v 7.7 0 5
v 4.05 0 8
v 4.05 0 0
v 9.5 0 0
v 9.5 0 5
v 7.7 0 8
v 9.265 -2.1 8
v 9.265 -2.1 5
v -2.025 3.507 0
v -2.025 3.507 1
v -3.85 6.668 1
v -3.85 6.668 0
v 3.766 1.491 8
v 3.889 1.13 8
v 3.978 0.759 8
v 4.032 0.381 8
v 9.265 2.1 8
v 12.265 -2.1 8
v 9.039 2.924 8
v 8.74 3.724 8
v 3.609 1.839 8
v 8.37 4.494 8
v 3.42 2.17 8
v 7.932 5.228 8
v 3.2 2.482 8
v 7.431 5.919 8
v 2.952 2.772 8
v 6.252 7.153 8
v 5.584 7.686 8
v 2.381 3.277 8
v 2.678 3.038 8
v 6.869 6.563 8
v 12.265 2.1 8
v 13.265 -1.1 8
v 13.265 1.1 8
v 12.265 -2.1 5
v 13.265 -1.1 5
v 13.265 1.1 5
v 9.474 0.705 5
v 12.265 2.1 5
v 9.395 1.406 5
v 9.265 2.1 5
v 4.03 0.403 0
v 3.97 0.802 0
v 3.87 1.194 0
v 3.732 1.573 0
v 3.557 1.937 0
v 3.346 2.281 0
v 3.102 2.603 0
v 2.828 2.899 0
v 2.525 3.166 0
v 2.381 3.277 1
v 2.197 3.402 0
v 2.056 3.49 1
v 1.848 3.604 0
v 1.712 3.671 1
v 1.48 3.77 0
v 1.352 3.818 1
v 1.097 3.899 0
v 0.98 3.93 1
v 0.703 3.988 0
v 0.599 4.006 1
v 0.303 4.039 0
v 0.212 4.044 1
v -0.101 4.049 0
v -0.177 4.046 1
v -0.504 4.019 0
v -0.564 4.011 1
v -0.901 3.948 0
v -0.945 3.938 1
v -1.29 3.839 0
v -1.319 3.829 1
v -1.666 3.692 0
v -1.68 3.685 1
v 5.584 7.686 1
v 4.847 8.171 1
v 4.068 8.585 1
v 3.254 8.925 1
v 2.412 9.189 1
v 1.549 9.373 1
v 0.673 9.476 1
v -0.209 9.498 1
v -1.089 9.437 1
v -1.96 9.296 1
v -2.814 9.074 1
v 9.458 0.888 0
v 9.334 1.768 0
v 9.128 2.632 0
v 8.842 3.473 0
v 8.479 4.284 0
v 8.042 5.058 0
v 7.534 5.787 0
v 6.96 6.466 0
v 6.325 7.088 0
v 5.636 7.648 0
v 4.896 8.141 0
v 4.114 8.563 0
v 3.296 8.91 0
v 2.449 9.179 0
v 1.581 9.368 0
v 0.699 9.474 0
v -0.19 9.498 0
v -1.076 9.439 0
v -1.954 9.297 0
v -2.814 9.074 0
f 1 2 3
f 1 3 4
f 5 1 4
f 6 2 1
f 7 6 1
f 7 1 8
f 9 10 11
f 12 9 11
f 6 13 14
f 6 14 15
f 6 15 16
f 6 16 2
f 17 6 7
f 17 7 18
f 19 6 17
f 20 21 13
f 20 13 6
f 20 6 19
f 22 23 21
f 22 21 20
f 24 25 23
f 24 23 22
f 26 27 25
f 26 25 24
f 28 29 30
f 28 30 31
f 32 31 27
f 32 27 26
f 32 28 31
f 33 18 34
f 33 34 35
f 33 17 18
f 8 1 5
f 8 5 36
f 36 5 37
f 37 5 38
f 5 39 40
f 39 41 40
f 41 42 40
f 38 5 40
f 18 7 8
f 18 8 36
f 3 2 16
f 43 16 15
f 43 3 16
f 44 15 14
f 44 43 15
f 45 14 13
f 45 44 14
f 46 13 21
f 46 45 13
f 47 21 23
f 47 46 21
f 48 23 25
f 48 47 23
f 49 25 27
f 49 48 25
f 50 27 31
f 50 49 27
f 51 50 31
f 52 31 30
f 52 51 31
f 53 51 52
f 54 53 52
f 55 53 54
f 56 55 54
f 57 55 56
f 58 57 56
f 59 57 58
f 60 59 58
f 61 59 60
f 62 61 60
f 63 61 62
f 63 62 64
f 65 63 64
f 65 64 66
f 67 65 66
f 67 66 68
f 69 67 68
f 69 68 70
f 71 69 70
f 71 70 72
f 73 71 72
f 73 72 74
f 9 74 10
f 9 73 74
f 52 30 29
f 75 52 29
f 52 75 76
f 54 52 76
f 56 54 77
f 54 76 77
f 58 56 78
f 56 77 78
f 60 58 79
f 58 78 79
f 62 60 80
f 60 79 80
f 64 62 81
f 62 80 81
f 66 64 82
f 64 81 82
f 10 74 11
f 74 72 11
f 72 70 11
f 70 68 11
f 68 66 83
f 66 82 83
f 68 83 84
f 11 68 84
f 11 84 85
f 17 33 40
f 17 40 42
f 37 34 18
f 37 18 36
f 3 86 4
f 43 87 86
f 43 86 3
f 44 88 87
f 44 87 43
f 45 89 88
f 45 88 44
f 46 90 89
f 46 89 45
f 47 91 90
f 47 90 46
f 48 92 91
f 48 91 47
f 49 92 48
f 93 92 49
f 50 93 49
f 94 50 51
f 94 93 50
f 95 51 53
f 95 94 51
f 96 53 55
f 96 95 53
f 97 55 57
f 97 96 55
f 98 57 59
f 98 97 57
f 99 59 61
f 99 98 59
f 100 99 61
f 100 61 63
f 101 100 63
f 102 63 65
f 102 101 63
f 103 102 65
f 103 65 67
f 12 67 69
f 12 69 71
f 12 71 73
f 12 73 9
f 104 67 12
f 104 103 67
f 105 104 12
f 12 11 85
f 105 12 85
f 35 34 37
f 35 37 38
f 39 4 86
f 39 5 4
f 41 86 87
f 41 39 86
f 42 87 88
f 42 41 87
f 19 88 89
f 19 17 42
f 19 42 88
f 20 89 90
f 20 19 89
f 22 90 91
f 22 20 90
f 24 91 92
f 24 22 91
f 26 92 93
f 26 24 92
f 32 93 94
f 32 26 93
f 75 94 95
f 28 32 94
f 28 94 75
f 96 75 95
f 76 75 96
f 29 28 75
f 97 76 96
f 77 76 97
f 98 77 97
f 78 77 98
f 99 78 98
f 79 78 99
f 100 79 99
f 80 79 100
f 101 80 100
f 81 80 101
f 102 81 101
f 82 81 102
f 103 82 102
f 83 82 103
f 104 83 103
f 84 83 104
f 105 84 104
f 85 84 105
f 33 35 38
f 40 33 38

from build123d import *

# Parameters (mm, degrees)
EXTRUDE002_DEPTH           = 3
EXTRUDE002_PLACEMENT_ANGLE = 120
EXTRUDE001_DEPTH           = 3
CHAMFER_SIZE               = 1
CYLINDER001_R              = 4.05
CYLINDER001_DEPTH          = 10
CYLINDER002_W              = 9.5
CYLINDER002_H              = 8
CYLINDER002_ANGLE          = 54
CYLINDER_W                 = 9.5
CYLINDER_H                 = 1
CYLINDER_ANGLE             = 120


with BuildPart() as extrude002:
    # Sketch001 (on Face11 of Cut002) → Extrude002 (new body)
    with BuildSketch(Plane.XY.offset(8)):
        Polygon((13.2649878575, 2.1), (9.2649878575, 2.1), (7.7, 0), (9.2649878575, -2.1), (13.2649878575, -2.1), align=None)
    extrude(amount=-EXTRUDE002_DEPTH)


with BuildPart() as extrude002_1:
    # Extrude002 placement: moved
    add(extrude002.part.moved(Location((0, 0, -7))).rotate(Axis((0, 0, -7), (0, 0, 1)), EXTRUDE002_PLACEMENT_ANGLE))


with BuildPart() as chamfer_body:
    # Sketch001 (on Face11 of Cut002) → Extrude001 (new body)
    with BuildSketch(Plane.XY.offset(8)):
        Polygon((13.2649878575, 2.1), (9.2649878575, 2.1), (7.7, 0), (9.2649878575, -2.1), (13.2649878575, -2.1), align=None)
    extrude(amount=-EXTRUDE001_DEPTH)

    # Chamfer
    chamfer_edges = [chamfer_body.edges().sort_by_distance(p)[0] for p in [
        (13.264988, 2.1, 6.5),
        (13.264988, -2.1, 6.5),
    ]]
    chamfer(chamfer_edges, length=CHAMFER_SIZE)


with BuildPart() as cylinder001:
    # Cylinder001 → Cylinder001 (new body)
    with BuildSketch(Plane.XY):
        Circle(CYLINDER001_R)
    extrude(amount=CYLINDER001_DEPTH)


with BuildPart() as cylinder002:
    # Cylinder002 → Cylinder002 (revolve)
    with BuildSketch(Plane.XZ):
        with Locations((4.75, 4)):
            Rectangle(CYLINDER002_W, CYLINDER002_H)
    revolve(axis=Axis((0, 0, 0), (0, 0, 1)), revolution_arc=CYLINDER002_ANGLE)


with BuildPart() as cut003:
    # Cylinder → Cylinder (revolve)
    with BuildSketch(Plane.XZ):
        with Locations((4.75, 0.5)):
            Rectangle(CYLINDER_W, CYLINDER_H)
    revolve(axis=Axis((0, 0, 0), (0, 0, 1)), revolution_arc=CYLINDER_ANGLE)

    # Fusion: union Cylinder002
    add(cylinder002.part)

    # Cut002: cut Cylinder001
    add(cylinder001.part, mode=Mode.SUBTRACT)

    # Fusion001: union Chamfer body
    add(chamfer_body.part)

    # Cut003: cut Extrude002
    add(extrude002_1.part, mode=Mode.SUBTRACT)


solid = cut003.part
